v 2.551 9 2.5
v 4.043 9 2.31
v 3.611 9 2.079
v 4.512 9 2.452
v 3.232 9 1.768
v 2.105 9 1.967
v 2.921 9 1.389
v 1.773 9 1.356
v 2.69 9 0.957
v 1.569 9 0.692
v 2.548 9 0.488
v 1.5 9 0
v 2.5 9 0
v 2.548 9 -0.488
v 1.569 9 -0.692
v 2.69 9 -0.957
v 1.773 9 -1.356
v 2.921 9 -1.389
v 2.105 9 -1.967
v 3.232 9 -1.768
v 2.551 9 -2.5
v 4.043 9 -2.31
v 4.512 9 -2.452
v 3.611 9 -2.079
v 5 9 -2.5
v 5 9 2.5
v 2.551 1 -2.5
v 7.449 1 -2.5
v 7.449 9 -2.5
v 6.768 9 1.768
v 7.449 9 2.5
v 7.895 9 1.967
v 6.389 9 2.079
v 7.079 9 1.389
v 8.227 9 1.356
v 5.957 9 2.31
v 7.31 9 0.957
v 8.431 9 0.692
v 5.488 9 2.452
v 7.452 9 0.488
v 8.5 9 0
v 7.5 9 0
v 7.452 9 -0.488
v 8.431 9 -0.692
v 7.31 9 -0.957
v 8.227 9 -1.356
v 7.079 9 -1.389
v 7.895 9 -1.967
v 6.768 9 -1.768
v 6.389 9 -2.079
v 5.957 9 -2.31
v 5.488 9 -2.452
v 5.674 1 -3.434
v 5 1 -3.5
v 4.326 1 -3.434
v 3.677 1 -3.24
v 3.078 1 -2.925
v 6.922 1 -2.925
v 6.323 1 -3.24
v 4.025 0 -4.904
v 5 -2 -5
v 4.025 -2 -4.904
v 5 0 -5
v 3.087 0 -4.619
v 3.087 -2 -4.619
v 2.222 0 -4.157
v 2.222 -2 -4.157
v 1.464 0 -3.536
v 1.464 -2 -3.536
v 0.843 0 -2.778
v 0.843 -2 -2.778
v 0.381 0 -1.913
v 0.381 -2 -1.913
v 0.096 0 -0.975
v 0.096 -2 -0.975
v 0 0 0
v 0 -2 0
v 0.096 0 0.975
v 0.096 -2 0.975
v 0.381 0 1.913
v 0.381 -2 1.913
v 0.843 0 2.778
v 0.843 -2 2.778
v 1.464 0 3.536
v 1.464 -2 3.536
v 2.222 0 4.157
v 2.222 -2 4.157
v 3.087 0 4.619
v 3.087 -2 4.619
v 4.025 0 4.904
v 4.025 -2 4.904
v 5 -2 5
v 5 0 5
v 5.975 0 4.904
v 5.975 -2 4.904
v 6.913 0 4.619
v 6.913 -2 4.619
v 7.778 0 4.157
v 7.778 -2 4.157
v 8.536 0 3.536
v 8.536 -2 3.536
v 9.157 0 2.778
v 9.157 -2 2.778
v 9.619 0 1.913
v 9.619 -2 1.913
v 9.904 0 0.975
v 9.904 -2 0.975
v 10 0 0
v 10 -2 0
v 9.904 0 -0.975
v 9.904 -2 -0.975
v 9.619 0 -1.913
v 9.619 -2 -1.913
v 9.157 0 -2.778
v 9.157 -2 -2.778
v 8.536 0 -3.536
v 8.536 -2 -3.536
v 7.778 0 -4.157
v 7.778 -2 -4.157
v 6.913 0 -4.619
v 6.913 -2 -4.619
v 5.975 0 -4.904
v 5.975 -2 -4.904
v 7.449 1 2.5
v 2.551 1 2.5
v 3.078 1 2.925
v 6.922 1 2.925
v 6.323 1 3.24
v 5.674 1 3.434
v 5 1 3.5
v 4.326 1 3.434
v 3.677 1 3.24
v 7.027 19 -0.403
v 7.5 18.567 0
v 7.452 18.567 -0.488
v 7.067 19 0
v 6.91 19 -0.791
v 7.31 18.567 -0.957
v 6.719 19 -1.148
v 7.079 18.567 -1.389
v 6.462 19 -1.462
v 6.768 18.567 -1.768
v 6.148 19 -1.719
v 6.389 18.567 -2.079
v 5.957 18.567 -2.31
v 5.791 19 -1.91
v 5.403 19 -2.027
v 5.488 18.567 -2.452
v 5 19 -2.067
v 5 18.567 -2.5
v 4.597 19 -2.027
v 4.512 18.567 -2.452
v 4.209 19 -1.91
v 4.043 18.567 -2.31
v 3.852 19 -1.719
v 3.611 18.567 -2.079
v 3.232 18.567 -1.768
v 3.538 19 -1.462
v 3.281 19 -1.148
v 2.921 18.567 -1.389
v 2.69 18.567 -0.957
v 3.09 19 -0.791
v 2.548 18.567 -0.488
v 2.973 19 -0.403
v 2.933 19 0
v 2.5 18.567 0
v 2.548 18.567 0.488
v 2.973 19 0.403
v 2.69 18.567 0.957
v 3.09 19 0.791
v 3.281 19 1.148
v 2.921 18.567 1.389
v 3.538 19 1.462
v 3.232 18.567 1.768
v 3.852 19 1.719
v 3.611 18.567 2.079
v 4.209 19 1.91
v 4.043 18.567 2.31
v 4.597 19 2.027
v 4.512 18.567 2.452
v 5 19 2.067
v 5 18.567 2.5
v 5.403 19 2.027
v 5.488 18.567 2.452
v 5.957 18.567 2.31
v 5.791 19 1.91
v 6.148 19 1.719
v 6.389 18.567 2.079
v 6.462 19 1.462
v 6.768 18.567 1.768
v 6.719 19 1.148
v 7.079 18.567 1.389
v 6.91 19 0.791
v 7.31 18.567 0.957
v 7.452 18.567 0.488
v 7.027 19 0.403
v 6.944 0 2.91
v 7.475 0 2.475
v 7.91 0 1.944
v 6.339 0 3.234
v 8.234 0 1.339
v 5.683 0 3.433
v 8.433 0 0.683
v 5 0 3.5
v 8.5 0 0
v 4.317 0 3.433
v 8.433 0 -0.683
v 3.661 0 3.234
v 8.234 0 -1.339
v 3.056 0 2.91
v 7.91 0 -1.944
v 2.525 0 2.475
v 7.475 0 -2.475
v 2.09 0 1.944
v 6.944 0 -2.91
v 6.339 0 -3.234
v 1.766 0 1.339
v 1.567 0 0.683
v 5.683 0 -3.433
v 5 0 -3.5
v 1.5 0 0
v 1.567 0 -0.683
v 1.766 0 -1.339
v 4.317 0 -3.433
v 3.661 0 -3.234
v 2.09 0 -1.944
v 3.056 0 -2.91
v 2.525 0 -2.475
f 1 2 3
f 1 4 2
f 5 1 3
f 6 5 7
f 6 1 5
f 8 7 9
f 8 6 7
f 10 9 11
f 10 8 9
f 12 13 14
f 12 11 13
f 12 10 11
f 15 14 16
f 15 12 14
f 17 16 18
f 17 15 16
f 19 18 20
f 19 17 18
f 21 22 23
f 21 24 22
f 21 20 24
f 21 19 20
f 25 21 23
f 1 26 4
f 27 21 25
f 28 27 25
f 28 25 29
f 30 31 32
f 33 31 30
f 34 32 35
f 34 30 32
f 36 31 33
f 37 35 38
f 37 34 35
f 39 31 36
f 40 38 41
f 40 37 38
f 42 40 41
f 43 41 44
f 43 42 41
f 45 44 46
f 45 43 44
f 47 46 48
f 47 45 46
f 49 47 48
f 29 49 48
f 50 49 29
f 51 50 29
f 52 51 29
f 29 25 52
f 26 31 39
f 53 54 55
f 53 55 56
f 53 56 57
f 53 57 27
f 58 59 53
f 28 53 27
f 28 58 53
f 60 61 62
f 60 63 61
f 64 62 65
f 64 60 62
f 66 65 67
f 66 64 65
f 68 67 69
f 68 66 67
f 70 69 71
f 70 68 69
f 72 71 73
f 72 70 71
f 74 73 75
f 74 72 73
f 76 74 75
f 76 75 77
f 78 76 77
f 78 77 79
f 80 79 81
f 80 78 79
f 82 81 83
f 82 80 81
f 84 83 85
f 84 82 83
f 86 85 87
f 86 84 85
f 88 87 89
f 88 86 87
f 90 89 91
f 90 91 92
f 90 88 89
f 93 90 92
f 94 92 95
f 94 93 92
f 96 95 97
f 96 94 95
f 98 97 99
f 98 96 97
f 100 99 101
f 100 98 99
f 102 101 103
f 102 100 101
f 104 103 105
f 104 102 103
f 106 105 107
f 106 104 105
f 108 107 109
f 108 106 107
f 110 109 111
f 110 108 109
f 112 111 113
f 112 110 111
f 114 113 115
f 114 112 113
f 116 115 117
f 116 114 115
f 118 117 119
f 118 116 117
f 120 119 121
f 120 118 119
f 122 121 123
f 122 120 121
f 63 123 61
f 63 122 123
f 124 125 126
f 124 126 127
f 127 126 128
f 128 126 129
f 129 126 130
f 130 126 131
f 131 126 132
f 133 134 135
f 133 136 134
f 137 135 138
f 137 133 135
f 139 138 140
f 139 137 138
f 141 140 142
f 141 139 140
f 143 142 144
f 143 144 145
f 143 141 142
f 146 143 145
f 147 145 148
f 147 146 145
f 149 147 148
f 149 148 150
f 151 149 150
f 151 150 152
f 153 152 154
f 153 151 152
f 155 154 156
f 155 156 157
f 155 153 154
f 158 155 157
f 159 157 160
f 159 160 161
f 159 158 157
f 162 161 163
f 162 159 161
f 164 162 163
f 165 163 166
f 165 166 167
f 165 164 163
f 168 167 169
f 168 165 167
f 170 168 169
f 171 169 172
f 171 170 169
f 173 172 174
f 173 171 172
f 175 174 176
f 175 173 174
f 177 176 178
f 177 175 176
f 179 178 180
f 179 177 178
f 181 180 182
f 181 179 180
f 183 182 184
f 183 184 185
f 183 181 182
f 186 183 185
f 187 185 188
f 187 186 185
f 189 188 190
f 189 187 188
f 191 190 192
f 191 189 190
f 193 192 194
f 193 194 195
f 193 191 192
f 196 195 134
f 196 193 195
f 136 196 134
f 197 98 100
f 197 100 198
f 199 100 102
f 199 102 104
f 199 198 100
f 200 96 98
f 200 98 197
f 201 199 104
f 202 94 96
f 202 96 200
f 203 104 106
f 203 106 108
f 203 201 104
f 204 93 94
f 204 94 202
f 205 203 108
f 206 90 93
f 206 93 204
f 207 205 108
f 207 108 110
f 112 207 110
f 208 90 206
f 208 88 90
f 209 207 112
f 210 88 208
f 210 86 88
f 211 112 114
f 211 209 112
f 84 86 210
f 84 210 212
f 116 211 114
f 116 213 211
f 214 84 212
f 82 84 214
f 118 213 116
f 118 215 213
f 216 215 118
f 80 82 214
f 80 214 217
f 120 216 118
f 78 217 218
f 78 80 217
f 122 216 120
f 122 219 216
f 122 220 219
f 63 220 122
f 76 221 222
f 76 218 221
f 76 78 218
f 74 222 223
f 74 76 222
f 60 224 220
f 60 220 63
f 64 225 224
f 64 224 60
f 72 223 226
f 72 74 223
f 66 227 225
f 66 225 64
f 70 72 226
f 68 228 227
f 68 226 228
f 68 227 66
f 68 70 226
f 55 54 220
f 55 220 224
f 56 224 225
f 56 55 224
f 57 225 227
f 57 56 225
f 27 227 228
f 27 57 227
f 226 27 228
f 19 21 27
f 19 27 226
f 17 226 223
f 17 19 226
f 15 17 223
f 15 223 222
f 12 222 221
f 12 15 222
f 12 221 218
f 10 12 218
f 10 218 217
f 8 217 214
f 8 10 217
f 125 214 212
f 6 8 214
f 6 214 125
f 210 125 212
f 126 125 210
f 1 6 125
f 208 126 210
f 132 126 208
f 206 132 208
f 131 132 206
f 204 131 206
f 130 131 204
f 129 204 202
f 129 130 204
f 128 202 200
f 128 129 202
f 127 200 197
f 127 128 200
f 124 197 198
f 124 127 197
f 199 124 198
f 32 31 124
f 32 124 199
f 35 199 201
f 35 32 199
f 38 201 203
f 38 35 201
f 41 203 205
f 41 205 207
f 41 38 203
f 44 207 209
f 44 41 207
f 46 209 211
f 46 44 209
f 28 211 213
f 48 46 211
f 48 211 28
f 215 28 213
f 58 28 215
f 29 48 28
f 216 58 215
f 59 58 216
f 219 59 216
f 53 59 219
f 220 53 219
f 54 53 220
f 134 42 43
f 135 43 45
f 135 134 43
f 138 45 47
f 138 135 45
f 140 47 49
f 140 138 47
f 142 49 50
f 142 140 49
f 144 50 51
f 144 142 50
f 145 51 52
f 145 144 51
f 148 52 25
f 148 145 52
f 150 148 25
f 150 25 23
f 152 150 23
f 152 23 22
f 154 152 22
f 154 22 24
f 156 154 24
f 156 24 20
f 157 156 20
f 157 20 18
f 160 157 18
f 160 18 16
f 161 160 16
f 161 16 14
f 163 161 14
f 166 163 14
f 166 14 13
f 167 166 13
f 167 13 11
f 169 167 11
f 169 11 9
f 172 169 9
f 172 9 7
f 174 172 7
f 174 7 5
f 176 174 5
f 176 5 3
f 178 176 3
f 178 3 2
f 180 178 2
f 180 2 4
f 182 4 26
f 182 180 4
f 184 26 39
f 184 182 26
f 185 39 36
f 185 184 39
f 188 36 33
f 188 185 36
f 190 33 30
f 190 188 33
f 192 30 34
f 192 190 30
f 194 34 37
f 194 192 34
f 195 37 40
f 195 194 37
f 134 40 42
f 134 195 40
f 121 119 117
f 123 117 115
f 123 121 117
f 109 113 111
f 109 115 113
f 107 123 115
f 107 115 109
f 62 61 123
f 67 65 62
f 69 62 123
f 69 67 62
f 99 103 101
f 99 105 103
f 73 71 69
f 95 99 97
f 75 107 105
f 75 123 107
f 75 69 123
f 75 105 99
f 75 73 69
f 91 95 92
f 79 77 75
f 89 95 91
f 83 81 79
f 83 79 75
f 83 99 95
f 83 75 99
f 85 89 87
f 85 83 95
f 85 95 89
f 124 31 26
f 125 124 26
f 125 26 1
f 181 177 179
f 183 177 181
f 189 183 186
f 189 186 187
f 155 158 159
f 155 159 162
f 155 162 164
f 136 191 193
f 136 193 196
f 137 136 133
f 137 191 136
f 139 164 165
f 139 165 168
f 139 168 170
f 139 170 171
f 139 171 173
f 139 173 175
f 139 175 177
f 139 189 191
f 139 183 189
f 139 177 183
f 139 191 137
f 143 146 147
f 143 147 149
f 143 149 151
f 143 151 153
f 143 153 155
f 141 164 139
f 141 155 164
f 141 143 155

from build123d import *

# Parameters (mm, degrees)
CUT_EXTRUDE_1_DEPTH = 8
EXTRUDE_START       = 7
SKETCH_3_R          = 2.5
EXTRUDE_1_DEPTH     = 7


# Read off the part's stored shape, not the designer's step: M5 机械螺纹 螺柱1
with BuildPart() as part:
    # Sketch 1 → 旋转1 (revolve)
    with BuildSketch(Plane.XY, mode=Mode.PRIVATE) as revolve_1_sk:
        Polygon((5, 9), (5, -2), (10, -2), (10, 0), (8.5, 0), (8.5, 9), align=None)
    revolve(revolve_1_sk.sketch.rotate(Axis((5, -2, 0), (0, 1, 0)), 90), axis=Axis((5, -2, 0), (0, 1, 0)))

    # Sketch 2 → 切除-拉伸1 (cut)
    with BuildSketch(Plane(origin=(0, 9, 0), x_dir=(1, 0, 0), z_dir=(0, 1, 0))):
        with BuildLine():
            ThreePointArc((7.449489743, 2.5), (5, 3.5), (2.550510257, 2.5))
            Line((2.550510257, 2.5), (7.449489743, 2.5))
        make_face()
        with BuildLine():
            Line((7.449489743, -2.5), (2.550510257, -2.5))
            ThreePointArc((2.550510257, -2.5), (5, -3.5), (7.449489743, -2.5))
        make_face()
    extrude(amount=-CUT_EXTRUDE_1_DEPTH, mode=Mode.SUBTRACT)

    # M5 机械螺纹 螺柱1 outline → M5 机械螺纹 螺柱1 (revolve)
    with BuildSketch(Plane(origin=(5, 0, 0), x_dir=(1, 0, 0), z_dir=(0, 0, 1))):
        Polygon((2.067, 19), (0, 19), (0, 9), (2.5, 9), (2.5, 18.567), align=None)
    revolve(axis=Axis((5, 0, 0), (0, 1, 0)))

    # 草图3 → 凸台-拉伸1 (add)
    with BuildSketch(Plane(origin=(0, 9, 0), x_dir=(1, 0, 0), z_dir=(0, 1, 0)).offset(EXTRUDE_START)):
        with Locations(Location((5, 0, 0), (0, 0, 90))):
            Circle(SKETCH_3_R)
    extrude(amount=-EXTRUDE_1_DEPTH)


solid = part.part
